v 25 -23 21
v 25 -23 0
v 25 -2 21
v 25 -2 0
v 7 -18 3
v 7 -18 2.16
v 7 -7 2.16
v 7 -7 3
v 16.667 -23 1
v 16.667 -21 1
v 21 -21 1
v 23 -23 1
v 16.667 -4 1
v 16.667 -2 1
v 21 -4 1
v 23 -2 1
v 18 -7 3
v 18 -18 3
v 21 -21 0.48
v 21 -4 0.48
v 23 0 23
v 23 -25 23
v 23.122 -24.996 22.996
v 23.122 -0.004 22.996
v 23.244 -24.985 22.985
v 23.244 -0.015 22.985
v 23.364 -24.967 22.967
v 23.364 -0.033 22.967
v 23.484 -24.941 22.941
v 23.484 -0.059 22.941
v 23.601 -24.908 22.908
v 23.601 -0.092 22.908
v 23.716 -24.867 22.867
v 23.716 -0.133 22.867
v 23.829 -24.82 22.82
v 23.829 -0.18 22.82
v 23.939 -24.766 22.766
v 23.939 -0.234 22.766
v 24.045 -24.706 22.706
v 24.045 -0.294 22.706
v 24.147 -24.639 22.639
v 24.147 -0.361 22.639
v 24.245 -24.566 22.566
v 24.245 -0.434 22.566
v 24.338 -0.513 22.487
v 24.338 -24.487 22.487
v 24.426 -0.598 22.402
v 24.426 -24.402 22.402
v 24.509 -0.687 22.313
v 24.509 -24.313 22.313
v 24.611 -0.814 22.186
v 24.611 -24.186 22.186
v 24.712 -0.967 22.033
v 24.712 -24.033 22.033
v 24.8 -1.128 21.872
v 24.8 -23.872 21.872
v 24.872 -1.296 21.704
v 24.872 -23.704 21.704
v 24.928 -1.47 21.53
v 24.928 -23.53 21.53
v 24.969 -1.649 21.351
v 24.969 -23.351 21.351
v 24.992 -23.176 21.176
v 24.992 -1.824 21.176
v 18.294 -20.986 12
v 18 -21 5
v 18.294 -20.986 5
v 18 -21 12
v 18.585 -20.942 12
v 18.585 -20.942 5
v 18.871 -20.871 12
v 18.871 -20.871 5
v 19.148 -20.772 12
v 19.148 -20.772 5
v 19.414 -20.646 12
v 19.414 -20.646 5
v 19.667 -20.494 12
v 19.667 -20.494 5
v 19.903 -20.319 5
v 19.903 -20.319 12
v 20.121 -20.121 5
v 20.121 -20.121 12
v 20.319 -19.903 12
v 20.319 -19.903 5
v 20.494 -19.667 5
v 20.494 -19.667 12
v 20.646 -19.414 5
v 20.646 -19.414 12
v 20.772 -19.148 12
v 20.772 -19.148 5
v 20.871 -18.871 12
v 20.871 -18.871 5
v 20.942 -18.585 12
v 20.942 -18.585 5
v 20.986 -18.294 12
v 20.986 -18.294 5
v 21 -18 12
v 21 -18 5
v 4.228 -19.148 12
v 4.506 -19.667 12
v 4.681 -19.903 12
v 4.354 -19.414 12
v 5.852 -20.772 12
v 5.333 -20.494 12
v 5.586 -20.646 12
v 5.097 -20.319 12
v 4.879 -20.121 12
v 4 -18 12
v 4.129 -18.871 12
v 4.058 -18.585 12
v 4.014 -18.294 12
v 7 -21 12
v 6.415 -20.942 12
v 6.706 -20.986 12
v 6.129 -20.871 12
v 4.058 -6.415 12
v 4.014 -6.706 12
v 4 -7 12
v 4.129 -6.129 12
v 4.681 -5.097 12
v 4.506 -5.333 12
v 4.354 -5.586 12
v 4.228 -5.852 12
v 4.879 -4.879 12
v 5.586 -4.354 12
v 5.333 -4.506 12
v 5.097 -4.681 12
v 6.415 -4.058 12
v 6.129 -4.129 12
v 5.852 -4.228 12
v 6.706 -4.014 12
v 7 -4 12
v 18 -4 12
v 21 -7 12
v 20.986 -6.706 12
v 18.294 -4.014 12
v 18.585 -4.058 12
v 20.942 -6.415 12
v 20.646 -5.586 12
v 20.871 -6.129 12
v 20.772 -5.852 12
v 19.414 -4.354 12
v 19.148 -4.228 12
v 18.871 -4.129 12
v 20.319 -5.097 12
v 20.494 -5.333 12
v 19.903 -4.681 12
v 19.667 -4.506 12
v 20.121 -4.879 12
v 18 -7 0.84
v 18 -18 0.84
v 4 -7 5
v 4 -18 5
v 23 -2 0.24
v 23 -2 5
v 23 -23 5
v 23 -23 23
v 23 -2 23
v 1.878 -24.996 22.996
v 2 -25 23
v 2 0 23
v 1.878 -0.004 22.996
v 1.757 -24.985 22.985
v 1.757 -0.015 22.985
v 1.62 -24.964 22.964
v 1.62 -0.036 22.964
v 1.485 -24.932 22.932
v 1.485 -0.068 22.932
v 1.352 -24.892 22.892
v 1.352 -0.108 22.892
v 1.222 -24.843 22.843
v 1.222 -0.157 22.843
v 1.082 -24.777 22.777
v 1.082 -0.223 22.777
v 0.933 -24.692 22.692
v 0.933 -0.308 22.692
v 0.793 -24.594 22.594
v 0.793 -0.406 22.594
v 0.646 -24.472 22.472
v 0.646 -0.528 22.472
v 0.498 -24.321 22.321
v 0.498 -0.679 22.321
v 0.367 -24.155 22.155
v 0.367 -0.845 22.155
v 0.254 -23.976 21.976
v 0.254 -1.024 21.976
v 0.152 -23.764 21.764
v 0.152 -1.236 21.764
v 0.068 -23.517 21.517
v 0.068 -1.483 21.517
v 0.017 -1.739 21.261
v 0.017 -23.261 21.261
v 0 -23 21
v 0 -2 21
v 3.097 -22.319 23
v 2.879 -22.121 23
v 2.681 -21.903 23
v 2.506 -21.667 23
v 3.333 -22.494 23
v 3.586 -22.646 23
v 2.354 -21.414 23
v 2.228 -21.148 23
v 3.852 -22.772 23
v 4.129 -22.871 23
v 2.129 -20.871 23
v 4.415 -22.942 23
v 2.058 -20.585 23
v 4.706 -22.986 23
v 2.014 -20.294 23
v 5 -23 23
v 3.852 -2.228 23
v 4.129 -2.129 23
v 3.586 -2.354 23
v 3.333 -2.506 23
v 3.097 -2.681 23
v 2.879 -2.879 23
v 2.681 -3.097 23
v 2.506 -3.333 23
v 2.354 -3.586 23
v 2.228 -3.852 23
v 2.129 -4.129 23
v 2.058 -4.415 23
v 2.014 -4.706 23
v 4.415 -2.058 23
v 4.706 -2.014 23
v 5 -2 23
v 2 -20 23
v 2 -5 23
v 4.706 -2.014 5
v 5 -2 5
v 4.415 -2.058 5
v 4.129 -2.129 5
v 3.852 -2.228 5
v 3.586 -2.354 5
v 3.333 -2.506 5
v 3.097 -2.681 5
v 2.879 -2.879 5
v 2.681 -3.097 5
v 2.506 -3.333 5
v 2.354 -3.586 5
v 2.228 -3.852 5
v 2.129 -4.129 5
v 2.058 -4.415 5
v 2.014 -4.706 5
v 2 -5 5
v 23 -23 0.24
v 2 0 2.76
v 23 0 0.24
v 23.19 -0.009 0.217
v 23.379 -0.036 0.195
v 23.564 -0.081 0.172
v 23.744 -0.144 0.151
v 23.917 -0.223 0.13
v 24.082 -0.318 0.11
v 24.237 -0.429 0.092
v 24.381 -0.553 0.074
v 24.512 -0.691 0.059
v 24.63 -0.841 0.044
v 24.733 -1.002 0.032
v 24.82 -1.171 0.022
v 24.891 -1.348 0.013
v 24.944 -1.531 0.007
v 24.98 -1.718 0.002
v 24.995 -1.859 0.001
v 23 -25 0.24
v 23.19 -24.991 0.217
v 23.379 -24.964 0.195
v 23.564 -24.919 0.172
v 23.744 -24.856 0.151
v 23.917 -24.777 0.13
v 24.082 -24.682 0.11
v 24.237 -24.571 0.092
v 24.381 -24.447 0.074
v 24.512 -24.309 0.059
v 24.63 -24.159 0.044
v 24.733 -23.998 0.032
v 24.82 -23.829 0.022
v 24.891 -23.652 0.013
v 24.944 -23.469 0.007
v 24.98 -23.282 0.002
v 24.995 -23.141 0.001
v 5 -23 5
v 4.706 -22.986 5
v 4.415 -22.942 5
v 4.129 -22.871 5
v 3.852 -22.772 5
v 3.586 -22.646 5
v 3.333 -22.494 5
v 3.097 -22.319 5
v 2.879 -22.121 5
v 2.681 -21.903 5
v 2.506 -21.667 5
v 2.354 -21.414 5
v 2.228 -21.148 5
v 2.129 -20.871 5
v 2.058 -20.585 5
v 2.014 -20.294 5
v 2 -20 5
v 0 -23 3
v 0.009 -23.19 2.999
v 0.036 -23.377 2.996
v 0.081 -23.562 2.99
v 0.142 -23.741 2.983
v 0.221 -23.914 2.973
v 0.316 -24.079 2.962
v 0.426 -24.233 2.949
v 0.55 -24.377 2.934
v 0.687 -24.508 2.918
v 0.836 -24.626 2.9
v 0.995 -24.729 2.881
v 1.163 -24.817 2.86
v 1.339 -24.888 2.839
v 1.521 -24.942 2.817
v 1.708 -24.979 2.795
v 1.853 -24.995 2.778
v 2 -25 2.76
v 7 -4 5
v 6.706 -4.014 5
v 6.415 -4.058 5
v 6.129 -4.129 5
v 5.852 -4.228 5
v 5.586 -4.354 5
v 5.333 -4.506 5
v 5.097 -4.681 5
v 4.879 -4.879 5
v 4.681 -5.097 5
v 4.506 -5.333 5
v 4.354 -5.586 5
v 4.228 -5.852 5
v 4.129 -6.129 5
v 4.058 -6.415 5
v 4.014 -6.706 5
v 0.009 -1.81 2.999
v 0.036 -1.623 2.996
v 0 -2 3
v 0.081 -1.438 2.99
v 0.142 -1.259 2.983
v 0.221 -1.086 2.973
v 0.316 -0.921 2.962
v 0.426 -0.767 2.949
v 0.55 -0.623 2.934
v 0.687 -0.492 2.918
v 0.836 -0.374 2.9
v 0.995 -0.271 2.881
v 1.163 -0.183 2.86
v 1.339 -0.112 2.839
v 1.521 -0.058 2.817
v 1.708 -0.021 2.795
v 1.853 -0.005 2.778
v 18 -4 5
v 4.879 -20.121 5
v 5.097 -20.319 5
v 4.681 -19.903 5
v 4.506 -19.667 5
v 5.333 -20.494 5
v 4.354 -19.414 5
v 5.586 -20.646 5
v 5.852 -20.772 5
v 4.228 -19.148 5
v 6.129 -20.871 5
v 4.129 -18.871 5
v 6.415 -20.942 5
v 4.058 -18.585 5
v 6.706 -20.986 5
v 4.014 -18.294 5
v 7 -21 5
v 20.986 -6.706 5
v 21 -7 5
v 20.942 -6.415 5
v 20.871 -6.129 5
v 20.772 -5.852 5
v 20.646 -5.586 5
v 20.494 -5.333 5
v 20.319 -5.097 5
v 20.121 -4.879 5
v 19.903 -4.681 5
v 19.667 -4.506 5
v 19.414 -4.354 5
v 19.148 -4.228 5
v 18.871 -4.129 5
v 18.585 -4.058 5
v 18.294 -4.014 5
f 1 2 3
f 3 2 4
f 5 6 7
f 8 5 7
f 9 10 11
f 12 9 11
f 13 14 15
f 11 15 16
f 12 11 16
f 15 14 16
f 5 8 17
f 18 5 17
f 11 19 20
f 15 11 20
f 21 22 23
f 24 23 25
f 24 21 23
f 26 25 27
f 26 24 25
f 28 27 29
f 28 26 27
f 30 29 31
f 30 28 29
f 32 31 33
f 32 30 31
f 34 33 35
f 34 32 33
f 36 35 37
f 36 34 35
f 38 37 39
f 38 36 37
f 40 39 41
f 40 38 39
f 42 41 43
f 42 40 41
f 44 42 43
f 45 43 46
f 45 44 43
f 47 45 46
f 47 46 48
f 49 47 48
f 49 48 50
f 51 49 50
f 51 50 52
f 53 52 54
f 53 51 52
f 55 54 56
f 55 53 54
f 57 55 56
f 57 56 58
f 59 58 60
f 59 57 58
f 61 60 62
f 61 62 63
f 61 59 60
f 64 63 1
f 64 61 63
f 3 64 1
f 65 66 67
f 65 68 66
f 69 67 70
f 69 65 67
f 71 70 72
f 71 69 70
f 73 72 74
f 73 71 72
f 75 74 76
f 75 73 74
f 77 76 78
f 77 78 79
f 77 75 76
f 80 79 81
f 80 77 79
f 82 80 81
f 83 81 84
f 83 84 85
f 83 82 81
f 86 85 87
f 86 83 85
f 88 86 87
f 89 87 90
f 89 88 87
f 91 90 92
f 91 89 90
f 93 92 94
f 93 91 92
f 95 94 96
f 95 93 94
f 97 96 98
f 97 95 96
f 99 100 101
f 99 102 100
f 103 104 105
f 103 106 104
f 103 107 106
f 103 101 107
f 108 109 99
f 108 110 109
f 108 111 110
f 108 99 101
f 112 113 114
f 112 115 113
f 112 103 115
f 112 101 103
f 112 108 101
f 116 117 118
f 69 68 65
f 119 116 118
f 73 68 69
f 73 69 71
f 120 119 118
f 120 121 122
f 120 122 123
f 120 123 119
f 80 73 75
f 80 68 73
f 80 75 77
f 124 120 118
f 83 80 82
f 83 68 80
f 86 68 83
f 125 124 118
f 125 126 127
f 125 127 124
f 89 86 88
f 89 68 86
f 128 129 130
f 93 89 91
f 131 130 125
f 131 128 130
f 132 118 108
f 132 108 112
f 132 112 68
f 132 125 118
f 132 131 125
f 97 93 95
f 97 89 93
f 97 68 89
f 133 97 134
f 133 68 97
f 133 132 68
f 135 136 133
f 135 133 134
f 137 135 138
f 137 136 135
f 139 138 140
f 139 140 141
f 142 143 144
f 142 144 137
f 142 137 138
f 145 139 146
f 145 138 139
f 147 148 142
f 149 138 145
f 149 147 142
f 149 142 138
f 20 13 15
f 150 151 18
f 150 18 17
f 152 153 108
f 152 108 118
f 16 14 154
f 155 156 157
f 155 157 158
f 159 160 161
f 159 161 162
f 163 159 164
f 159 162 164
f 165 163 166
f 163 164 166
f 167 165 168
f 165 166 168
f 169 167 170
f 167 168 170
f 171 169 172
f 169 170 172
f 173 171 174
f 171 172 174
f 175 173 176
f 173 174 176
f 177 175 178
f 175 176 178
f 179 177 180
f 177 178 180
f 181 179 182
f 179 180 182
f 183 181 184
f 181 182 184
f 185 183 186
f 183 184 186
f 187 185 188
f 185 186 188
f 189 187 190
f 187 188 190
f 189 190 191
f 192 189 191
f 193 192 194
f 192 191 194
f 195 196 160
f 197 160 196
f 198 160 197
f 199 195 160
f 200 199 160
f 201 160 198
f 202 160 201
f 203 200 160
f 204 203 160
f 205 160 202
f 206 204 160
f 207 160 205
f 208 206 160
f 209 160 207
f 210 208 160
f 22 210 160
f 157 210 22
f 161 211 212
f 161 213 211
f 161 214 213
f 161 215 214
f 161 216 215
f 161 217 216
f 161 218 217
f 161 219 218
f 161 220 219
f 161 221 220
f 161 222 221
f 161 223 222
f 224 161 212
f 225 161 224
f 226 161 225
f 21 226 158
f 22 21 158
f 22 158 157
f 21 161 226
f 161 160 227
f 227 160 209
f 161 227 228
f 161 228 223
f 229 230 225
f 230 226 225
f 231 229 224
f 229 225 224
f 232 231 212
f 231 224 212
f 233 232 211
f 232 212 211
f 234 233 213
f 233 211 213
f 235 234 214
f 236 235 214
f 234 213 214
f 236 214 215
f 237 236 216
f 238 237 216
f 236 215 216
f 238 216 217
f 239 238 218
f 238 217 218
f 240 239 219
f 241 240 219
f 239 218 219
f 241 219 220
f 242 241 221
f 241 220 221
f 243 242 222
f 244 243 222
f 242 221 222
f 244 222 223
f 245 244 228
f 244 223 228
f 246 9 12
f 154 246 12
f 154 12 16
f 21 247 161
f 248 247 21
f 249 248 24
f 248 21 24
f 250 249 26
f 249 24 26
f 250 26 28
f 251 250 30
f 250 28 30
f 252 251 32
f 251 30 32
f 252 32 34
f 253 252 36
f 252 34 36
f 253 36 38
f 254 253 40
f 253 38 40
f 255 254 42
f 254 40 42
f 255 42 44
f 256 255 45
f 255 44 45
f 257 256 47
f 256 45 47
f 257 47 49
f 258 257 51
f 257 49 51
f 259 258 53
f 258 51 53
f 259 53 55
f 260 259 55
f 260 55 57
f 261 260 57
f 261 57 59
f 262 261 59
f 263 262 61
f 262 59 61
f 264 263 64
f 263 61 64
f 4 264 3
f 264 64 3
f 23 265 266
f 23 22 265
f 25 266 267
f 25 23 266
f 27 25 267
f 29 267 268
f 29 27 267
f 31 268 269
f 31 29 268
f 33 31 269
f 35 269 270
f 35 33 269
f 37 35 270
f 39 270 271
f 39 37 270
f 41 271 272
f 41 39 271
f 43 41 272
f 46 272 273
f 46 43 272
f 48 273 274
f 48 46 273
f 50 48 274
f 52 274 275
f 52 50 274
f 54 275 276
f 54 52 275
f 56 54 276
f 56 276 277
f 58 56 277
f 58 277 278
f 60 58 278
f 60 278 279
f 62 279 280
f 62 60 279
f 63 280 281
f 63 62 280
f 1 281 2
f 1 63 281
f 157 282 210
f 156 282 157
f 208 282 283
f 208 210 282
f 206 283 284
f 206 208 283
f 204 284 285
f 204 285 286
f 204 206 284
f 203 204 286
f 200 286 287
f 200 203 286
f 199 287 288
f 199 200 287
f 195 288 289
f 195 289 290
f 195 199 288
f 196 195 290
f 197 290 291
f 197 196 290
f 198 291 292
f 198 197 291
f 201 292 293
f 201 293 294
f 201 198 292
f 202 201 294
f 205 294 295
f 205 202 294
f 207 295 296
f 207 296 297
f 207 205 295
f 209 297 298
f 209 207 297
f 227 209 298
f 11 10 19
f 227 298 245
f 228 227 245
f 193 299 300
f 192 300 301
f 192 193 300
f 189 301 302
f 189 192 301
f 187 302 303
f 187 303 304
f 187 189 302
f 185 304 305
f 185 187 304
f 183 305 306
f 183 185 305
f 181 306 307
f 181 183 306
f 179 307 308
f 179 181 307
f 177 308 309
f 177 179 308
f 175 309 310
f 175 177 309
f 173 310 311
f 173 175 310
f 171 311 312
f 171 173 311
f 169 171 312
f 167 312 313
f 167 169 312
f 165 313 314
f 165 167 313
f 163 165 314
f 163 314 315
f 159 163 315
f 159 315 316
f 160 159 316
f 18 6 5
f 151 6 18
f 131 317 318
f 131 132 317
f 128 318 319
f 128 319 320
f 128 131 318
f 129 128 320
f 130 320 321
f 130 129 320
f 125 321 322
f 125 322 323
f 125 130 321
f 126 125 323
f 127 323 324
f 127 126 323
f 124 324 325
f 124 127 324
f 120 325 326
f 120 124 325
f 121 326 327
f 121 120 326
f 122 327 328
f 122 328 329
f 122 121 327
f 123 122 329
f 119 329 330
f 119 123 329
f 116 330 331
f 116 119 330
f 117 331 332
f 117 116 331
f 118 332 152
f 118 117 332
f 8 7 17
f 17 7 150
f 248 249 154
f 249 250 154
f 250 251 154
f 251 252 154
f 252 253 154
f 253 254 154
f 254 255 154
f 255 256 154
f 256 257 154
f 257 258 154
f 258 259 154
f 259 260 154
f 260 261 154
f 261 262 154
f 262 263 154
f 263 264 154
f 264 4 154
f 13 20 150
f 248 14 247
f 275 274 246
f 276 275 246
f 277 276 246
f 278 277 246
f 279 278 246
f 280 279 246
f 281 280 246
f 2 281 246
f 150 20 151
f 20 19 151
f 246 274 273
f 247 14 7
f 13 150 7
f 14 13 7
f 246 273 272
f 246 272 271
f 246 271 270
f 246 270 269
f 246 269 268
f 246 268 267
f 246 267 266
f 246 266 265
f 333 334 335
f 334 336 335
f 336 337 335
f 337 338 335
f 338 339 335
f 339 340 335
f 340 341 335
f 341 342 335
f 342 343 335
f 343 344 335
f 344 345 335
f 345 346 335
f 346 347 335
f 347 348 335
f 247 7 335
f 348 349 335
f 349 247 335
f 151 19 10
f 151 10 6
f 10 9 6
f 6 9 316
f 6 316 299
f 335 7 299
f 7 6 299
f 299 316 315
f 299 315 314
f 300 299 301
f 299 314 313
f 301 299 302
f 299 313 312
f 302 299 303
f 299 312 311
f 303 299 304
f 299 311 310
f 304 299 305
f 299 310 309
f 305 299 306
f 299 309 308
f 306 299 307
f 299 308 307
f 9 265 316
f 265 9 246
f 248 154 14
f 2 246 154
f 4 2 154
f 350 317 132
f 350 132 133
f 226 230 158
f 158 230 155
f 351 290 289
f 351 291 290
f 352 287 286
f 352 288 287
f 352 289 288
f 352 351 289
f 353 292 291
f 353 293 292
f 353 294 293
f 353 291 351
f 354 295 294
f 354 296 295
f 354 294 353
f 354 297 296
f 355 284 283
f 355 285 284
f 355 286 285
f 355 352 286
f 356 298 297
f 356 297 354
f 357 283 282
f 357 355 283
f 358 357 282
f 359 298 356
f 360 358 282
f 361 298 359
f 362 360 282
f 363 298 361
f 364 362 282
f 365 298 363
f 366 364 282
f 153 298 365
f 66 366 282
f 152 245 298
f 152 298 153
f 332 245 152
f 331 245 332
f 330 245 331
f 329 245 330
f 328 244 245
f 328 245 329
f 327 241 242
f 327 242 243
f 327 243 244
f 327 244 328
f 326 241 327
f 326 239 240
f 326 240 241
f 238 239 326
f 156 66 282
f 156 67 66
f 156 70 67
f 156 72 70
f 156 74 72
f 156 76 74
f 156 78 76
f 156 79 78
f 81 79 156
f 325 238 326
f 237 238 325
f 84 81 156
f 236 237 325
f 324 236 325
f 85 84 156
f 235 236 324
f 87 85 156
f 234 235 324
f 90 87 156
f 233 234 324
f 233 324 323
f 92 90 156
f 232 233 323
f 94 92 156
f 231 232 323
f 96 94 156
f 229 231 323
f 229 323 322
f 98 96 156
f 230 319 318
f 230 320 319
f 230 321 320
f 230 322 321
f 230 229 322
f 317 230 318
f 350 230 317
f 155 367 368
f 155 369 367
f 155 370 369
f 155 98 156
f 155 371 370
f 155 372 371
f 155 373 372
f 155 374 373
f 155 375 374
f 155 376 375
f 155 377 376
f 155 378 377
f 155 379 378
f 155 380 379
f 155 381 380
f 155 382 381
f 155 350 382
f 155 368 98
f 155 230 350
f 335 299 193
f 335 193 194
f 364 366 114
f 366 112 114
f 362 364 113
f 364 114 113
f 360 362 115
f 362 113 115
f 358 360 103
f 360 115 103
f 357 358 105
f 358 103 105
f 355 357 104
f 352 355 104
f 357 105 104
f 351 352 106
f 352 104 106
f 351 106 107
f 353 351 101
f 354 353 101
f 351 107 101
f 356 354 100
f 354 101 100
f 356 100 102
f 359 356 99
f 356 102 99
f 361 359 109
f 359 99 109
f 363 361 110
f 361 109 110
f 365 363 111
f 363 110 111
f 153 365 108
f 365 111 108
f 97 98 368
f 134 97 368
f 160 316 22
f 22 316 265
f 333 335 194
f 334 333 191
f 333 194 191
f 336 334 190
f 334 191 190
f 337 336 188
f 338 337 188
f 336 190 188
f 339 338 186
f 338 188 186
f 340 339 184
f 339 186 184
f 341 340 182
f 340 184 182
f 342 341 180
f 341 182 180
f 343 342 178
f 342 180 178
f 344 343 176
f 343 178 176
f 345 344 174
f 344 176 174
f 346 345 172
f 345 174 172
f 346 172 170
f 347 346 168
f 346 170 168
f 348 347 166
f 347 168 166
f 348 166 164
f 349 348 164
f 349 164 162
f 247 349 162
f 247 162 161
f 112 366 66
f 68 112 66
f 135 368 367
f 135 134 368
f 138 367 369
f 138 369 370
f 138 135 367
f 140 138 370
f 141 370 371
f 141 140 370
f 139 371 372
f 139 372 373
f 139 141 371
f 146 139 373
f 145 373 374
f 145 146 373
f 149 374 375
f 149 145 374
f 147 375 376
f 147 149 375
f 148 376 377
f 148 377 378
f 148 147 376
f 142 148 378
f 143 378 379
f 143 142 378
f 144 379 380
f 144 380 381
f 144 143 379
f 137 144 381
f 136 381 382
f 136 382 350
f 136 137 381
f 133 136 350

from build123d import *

# Parameters (mm, degrees)
F0_W     = 25
F0_H     = 25
F0_W_2   = 21
F0_H_2   = 21
F1_DEPTH = 23
F0_W_3   = 17
F0_H_3   = 17
F2_DEPTH = 5
F0_W_4   = 11
F0_H_4   = 11
F3_DEPTH = 12
F4_DEPTH = 3
F5_DEPTH = 1
F7_DEPTH = 25
F8_R     = 1.99999
F9_R     = 3


# Not quite as in the source:
# - a fillet or chamfer is up to 0.001 mm smaller than in the source, because OpenCascade refuses the exact size


with BuildPart() as f1:
    # F0 (on Top) → F1 (new body)
    with BuildSketch(Plane.XY):
        with Locations((12.5, -12.5)):
            Rectangle(F0_W, F0_H)
        with Locations((12.5, -12.5)):
            Rectangle(F0_W_2, F0_H_2, mode=Mode.SUBTRACT)
    extrude(amount=F1_DEPTH)

    # F0 (on Top) → F2 (join)
    with BuildSketch(Plane.XY):
        with Locations((12.5, -12.5)):
            Rectangle(F0_W_2, F0_H_2)
        with Locations((12.5, -12.5)):
            Rectangle(F0_W_3, F0_H_3, mode=Mode.SUBTRACT)
    extrude(amount=F2_DEPTH)

    # F0 (on Top) → F3 (join)
    with BuildSketch(Plane.XY):
        with Locations((12.5, -12.5)):
            Rectangle(F0_W_3, F0_H_3)
        with Locations((12.5, -12.5)):
            Rectangle(F0_W_4, F0_H_4, mode=Mode.SUBTRACT)
        with Locations((12.5, -12.5)):
            Rectangle(F0_W_4, F0_H_4)
    extrude(amount=F3_DEPTH)

    # F0 (on Top) → F4 (cut)
    with BuildSketch(Plane.XY):
        with Locations((12.5, -12.5)):
            Rectangle(F0_W_4, F0_H_4)
    extrude(amount=F4_DEPTH, mode=Mode.SUBTRACT)

    # F0 (on Top) → F5 (cut)
    with BuildSketch(Plane.XY):
        with Locations((12.5, -12.5)):
            Rectangle(F0_W_2, F0_H_2)
        with Locations((12.5, -12.5)):
            Rectangle(F0_W_3, F0_H_3, mode=Mode.SUBTRACT)
    extrude(amount=F5_DEPTH, mode=Mode.SUBTRACT)

    # F6 (on face) → F7 (cut, through all)
    with BuildSketch(Plane.XZ.offset(25)):
        Polygon((25, 0), (0, 3), (0, 0), align=None)
    extrude(amount=-F7_DEPTH, mode=Mode.SUBTRACT)

    # F8 (radius 2 in the source; OpenCascade refuses exactly that, so slightly less here)
    f8_edges = [f1.edges().sort_by_distance(p)[0] for p in [
        (25, -25, 11.5),
        (0, -25, 13),
        (0, 0, 13),
        (25, 0, 11.5),
        (0, -12.5, 23),
        (25, -12.5, 23),
    ]]
    fillet(f8_edges, radius=F8_R)

    # F9
    f9_edges = [f1.edges().sort_by_distance(p)[0] for p in [
        (2, -2, 14),
        (4, -4, 8.5),
        (21, -4, 8.5),
        (21, -21, 8.5),
        (4, -21, 8.5),
        (2, -23, 14),
    ]]
    fillet(f9_edges, radius=F9_R)


solid = f1.part
